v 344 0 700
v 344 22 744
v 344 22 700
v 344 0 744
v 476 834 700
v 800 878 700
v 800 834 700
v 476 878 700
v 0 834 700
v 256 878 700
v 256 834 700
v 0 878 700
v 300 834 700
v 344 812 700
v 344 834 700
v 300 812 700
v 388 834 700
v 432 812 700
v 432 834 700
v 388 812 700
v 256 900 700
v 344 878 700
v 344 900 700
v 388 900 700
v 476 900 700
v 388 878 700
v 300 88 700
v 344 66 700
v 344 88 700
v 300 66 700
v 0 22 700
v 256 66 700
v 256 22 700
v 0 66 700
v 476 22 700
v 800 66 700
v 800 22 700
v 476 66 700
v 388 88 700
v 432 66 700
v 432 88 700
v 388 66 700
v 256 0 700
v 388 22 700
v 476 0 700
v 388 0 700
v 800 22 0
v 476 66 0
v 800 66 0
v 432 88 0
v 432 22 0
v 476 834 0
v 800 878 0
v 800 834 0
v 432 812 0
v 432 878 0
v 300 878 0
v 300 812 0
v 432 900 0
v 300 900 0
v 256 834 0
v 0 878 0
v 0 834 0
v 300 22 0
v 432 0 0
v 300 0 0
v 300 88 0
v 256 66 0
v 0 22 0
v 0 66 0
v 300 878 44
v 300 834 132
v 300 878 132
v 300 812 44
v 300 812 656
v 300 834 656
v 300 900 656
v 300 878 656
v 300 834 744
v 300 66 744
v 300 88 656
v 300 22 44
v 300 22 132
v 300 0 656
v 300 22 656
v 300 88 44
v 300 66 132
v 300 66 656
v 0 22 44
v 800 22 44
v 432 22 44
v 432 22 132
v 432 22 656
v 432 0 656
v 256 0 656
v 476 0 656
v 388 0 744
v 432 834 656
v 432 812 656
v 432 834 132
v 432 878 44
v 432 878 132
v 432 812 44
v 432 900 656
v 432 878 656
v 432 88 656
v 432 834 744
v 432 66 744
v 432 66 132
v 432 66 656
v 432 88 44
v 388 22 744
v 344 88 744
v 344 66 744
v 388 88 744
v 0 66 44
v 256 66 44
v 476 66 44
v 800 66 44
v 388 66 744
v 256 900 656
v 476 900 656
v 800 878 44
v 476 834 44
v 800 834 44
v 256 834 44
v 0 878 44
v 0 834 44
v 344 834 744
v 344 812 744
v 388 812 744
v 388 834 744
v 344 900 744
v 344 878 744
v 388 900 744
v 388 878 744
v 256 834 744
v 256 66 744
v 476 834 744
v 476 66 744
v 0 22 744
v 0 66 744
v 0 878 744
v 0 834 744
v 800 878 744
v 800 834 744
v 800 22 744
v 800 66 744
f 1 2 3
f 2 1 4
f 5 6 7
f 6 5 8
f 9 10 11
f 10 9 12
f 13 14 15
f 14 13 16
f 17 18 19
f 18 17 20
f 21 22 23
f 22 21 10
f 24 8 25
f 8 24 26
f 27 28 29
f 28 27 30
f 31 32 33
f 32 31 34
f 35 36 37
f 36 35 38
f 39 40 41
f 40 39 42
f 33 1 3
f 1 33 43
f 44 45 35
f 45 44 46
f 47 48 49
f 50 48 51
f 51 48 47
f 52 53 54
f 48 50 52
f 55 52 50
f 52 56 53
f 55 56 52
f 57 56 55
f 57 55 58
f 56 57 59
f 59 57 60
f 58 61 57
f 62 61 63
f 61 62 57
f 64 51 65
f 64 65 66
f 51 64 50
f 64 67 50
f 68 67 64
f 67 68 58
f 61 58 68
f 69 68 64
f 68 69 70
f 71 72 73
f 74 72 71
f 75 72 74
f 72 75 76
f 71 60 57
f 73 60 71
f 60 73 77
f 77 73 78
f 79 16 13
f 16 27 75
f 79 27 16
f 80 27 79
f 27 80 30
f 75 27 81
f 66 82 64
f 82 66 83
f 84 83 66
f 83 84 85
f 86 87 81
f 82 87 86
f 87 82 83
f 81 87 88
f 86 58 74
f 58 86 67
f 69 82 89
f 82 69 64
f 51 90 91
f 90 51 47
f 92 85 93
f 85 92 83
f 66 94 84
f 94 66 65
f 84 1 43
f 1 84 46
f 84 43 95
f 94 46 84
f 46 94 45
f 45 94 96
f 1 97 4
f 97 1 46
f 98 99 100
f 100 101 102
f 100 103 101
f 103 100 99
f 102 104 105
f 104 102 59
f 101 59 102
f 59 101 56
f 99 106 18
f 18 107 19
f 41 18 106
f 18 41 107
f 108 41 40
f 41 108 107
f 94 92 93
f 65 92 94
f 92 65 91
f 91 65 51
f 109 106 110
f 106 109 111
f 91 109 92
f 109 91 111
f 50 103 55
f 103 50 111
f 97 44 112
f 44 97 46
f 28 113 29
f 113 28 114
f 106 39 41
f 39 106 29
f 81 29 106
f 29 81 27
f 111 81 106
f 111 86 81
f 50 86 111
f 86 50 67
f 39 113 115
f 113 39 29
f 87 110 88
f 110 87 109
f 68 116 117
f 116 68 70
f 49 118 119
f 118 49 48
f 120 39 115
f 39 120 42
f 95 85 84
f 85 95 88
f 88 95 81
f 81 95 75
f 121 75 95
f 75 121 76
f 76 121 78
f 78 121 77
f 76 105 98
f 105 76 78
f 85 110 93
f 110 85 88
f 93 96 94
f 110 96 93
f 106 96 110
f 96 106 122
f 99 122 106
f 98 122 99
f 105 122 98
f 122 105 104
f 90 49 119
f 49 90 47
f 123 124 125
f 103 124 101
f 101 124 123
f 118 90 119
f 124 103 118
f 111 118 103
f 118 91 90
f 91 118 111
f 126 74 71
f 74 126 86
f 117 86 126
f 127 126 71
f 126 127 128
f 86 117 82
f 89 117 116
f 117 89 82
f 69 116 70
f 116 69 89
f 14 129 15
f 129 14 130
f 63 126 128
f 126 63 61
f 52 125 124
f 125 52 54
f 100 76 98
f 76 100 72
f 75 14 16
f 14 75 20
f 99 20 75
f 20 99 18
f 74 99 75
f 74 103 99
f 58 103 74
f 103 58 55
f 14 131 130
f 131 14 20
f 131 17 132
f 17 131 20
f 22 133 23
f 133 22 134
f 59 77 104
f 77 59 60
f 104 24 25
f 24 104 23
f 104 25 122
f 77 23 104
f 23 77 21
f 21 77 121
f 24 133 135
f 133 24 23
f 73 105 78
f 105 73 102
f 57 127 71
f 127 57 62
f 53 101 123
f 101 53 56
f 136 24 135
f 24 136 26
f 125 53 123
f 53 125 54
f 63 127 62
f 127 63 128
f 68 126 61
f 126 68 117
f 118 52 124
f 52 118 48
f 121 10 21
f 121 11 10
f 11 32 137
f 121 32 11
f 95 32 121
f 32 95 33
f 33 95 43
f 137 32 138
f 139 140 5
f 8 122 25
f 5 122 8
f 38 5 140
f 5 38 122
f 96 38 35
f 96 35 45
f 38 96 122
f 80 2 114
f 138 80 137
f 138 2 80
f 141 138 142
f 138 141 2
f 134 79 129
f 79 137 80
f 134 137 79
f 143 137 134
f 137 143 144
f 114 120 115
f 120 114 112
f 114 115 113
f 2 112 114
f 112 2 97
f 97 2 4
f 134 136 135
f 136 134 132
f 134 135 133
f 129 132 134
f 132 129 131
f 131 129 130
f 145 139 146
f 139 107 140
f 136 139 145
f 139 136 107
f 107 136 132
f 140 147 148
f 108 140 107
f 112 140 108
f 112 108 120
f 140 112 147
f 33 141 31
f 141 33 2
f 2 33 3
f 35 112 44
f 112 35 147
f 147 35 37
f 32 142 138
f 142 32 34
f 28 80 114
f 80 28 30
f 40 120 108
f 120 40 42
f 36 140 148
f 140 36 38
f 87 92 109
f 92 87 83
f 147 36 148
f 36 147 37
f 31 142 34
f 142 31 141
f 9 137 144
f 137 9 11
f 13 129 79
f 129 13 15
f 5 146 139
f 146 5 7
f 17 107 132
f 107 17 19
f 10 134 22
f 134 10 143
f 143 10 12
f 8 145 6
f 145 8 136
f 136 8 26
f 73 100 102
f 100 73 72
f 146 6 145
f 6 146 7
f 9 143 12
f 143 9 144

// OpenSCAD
// Outer dimensions of entire desk in sitting position
x=800; // depth of the table
y=900; // width of the table
z=700; // height of the table excluding the table top thickness and top thickness

// The extra height required
extension=0;

// Thickness of wood pieces
t1=22;
t2=44;

// distance the leg is from the back wall
leg_wall_distance=300;


base_leg=[t2, t1, z];
base_leg_cross_support=[3*t2, t2, t2];
module m_base_leg(){
     translate() cube(base_leg);
     translate([t2+t2, 0, 0]) cube(base_leg);
     translate([0, t1+t2, 0]) cube(base_leg);
     translate([t2+t2, t1+t2, 0]) cube(base_leg);
     translate([0, t1, z-t2]) cube(base_leg_cross_support);
}

base_stand=[x, t2, t2];
module m_base_01(width_offset){
     translate(width_offset){
          translate([leg_wall_distance, 0, 0]) {
               m_base_leg();
          }
          translate([0,t1,0]) cube(base_stand);
     }
}

base_cross_support_bottom=[t2, y-2*t1-2*t2, t2];
base_cross_support_top=[t2, y, t2];
module m_base(){
     //left leg
     m_base_01([0, 0, 0]);

     // right leg
     m_base_01([0, y-t1-t1-t2, 0]);

     // cross supports
     translate([leg_wall_distance-t2, t1+t2, 0]) cube(base_cross_support_bottom);
     translate([leg_wall_distance+3*t2, t1+t2, 0]) cube(base_cross_support_bottom);
     translate([leg_wall_distance-t2, 0, z-t2]) cube(base_cross_support_top);
     translate([leg_wall_distance+3*t2, 0, z-t2]) cube(base_cross_support_top);

}

top_leg=[t2, t1, z+t2];
top_leg_cross_support=[3*t2, t2, t2];

module m_top_leg(){
     translate([]) cube(top_leg);
     translate([0, t1+t2, 0]) cube(top_leg);
     translate([-t2, t1, t2]) cube(base_leg_cross_support);
     translate([-t2, t1, t2+t2]) cube(base_leg_cross_support);
}

module m_top_leg_and_support(width_offset){
     translate(width_offset){
          translate([leg_wall_distance+t2, 0, 0]) {
               m_top_leg();
          }
          translate([0,t1,z]) cube(base_stand);
     }
}

top_support=[x, t2, t2];
module m_top(){
     translate([0, 0, extension]){
          // left leg
          m_top_leg_and_support([0,0,0]);

          // right leg
          m_top_leg_and_support([0, y-t1-t1-t2, 0]);

          // cross supports bottom
          translate([leg_wall_distance-t2, t1+t2, z]) cube(base_cross_support_bottom);
          translate([leg_wall_distance+3*t2, t1+t2, z]) cube(base_cross_support_bottom);
     }

}

m_base();
m_top();
